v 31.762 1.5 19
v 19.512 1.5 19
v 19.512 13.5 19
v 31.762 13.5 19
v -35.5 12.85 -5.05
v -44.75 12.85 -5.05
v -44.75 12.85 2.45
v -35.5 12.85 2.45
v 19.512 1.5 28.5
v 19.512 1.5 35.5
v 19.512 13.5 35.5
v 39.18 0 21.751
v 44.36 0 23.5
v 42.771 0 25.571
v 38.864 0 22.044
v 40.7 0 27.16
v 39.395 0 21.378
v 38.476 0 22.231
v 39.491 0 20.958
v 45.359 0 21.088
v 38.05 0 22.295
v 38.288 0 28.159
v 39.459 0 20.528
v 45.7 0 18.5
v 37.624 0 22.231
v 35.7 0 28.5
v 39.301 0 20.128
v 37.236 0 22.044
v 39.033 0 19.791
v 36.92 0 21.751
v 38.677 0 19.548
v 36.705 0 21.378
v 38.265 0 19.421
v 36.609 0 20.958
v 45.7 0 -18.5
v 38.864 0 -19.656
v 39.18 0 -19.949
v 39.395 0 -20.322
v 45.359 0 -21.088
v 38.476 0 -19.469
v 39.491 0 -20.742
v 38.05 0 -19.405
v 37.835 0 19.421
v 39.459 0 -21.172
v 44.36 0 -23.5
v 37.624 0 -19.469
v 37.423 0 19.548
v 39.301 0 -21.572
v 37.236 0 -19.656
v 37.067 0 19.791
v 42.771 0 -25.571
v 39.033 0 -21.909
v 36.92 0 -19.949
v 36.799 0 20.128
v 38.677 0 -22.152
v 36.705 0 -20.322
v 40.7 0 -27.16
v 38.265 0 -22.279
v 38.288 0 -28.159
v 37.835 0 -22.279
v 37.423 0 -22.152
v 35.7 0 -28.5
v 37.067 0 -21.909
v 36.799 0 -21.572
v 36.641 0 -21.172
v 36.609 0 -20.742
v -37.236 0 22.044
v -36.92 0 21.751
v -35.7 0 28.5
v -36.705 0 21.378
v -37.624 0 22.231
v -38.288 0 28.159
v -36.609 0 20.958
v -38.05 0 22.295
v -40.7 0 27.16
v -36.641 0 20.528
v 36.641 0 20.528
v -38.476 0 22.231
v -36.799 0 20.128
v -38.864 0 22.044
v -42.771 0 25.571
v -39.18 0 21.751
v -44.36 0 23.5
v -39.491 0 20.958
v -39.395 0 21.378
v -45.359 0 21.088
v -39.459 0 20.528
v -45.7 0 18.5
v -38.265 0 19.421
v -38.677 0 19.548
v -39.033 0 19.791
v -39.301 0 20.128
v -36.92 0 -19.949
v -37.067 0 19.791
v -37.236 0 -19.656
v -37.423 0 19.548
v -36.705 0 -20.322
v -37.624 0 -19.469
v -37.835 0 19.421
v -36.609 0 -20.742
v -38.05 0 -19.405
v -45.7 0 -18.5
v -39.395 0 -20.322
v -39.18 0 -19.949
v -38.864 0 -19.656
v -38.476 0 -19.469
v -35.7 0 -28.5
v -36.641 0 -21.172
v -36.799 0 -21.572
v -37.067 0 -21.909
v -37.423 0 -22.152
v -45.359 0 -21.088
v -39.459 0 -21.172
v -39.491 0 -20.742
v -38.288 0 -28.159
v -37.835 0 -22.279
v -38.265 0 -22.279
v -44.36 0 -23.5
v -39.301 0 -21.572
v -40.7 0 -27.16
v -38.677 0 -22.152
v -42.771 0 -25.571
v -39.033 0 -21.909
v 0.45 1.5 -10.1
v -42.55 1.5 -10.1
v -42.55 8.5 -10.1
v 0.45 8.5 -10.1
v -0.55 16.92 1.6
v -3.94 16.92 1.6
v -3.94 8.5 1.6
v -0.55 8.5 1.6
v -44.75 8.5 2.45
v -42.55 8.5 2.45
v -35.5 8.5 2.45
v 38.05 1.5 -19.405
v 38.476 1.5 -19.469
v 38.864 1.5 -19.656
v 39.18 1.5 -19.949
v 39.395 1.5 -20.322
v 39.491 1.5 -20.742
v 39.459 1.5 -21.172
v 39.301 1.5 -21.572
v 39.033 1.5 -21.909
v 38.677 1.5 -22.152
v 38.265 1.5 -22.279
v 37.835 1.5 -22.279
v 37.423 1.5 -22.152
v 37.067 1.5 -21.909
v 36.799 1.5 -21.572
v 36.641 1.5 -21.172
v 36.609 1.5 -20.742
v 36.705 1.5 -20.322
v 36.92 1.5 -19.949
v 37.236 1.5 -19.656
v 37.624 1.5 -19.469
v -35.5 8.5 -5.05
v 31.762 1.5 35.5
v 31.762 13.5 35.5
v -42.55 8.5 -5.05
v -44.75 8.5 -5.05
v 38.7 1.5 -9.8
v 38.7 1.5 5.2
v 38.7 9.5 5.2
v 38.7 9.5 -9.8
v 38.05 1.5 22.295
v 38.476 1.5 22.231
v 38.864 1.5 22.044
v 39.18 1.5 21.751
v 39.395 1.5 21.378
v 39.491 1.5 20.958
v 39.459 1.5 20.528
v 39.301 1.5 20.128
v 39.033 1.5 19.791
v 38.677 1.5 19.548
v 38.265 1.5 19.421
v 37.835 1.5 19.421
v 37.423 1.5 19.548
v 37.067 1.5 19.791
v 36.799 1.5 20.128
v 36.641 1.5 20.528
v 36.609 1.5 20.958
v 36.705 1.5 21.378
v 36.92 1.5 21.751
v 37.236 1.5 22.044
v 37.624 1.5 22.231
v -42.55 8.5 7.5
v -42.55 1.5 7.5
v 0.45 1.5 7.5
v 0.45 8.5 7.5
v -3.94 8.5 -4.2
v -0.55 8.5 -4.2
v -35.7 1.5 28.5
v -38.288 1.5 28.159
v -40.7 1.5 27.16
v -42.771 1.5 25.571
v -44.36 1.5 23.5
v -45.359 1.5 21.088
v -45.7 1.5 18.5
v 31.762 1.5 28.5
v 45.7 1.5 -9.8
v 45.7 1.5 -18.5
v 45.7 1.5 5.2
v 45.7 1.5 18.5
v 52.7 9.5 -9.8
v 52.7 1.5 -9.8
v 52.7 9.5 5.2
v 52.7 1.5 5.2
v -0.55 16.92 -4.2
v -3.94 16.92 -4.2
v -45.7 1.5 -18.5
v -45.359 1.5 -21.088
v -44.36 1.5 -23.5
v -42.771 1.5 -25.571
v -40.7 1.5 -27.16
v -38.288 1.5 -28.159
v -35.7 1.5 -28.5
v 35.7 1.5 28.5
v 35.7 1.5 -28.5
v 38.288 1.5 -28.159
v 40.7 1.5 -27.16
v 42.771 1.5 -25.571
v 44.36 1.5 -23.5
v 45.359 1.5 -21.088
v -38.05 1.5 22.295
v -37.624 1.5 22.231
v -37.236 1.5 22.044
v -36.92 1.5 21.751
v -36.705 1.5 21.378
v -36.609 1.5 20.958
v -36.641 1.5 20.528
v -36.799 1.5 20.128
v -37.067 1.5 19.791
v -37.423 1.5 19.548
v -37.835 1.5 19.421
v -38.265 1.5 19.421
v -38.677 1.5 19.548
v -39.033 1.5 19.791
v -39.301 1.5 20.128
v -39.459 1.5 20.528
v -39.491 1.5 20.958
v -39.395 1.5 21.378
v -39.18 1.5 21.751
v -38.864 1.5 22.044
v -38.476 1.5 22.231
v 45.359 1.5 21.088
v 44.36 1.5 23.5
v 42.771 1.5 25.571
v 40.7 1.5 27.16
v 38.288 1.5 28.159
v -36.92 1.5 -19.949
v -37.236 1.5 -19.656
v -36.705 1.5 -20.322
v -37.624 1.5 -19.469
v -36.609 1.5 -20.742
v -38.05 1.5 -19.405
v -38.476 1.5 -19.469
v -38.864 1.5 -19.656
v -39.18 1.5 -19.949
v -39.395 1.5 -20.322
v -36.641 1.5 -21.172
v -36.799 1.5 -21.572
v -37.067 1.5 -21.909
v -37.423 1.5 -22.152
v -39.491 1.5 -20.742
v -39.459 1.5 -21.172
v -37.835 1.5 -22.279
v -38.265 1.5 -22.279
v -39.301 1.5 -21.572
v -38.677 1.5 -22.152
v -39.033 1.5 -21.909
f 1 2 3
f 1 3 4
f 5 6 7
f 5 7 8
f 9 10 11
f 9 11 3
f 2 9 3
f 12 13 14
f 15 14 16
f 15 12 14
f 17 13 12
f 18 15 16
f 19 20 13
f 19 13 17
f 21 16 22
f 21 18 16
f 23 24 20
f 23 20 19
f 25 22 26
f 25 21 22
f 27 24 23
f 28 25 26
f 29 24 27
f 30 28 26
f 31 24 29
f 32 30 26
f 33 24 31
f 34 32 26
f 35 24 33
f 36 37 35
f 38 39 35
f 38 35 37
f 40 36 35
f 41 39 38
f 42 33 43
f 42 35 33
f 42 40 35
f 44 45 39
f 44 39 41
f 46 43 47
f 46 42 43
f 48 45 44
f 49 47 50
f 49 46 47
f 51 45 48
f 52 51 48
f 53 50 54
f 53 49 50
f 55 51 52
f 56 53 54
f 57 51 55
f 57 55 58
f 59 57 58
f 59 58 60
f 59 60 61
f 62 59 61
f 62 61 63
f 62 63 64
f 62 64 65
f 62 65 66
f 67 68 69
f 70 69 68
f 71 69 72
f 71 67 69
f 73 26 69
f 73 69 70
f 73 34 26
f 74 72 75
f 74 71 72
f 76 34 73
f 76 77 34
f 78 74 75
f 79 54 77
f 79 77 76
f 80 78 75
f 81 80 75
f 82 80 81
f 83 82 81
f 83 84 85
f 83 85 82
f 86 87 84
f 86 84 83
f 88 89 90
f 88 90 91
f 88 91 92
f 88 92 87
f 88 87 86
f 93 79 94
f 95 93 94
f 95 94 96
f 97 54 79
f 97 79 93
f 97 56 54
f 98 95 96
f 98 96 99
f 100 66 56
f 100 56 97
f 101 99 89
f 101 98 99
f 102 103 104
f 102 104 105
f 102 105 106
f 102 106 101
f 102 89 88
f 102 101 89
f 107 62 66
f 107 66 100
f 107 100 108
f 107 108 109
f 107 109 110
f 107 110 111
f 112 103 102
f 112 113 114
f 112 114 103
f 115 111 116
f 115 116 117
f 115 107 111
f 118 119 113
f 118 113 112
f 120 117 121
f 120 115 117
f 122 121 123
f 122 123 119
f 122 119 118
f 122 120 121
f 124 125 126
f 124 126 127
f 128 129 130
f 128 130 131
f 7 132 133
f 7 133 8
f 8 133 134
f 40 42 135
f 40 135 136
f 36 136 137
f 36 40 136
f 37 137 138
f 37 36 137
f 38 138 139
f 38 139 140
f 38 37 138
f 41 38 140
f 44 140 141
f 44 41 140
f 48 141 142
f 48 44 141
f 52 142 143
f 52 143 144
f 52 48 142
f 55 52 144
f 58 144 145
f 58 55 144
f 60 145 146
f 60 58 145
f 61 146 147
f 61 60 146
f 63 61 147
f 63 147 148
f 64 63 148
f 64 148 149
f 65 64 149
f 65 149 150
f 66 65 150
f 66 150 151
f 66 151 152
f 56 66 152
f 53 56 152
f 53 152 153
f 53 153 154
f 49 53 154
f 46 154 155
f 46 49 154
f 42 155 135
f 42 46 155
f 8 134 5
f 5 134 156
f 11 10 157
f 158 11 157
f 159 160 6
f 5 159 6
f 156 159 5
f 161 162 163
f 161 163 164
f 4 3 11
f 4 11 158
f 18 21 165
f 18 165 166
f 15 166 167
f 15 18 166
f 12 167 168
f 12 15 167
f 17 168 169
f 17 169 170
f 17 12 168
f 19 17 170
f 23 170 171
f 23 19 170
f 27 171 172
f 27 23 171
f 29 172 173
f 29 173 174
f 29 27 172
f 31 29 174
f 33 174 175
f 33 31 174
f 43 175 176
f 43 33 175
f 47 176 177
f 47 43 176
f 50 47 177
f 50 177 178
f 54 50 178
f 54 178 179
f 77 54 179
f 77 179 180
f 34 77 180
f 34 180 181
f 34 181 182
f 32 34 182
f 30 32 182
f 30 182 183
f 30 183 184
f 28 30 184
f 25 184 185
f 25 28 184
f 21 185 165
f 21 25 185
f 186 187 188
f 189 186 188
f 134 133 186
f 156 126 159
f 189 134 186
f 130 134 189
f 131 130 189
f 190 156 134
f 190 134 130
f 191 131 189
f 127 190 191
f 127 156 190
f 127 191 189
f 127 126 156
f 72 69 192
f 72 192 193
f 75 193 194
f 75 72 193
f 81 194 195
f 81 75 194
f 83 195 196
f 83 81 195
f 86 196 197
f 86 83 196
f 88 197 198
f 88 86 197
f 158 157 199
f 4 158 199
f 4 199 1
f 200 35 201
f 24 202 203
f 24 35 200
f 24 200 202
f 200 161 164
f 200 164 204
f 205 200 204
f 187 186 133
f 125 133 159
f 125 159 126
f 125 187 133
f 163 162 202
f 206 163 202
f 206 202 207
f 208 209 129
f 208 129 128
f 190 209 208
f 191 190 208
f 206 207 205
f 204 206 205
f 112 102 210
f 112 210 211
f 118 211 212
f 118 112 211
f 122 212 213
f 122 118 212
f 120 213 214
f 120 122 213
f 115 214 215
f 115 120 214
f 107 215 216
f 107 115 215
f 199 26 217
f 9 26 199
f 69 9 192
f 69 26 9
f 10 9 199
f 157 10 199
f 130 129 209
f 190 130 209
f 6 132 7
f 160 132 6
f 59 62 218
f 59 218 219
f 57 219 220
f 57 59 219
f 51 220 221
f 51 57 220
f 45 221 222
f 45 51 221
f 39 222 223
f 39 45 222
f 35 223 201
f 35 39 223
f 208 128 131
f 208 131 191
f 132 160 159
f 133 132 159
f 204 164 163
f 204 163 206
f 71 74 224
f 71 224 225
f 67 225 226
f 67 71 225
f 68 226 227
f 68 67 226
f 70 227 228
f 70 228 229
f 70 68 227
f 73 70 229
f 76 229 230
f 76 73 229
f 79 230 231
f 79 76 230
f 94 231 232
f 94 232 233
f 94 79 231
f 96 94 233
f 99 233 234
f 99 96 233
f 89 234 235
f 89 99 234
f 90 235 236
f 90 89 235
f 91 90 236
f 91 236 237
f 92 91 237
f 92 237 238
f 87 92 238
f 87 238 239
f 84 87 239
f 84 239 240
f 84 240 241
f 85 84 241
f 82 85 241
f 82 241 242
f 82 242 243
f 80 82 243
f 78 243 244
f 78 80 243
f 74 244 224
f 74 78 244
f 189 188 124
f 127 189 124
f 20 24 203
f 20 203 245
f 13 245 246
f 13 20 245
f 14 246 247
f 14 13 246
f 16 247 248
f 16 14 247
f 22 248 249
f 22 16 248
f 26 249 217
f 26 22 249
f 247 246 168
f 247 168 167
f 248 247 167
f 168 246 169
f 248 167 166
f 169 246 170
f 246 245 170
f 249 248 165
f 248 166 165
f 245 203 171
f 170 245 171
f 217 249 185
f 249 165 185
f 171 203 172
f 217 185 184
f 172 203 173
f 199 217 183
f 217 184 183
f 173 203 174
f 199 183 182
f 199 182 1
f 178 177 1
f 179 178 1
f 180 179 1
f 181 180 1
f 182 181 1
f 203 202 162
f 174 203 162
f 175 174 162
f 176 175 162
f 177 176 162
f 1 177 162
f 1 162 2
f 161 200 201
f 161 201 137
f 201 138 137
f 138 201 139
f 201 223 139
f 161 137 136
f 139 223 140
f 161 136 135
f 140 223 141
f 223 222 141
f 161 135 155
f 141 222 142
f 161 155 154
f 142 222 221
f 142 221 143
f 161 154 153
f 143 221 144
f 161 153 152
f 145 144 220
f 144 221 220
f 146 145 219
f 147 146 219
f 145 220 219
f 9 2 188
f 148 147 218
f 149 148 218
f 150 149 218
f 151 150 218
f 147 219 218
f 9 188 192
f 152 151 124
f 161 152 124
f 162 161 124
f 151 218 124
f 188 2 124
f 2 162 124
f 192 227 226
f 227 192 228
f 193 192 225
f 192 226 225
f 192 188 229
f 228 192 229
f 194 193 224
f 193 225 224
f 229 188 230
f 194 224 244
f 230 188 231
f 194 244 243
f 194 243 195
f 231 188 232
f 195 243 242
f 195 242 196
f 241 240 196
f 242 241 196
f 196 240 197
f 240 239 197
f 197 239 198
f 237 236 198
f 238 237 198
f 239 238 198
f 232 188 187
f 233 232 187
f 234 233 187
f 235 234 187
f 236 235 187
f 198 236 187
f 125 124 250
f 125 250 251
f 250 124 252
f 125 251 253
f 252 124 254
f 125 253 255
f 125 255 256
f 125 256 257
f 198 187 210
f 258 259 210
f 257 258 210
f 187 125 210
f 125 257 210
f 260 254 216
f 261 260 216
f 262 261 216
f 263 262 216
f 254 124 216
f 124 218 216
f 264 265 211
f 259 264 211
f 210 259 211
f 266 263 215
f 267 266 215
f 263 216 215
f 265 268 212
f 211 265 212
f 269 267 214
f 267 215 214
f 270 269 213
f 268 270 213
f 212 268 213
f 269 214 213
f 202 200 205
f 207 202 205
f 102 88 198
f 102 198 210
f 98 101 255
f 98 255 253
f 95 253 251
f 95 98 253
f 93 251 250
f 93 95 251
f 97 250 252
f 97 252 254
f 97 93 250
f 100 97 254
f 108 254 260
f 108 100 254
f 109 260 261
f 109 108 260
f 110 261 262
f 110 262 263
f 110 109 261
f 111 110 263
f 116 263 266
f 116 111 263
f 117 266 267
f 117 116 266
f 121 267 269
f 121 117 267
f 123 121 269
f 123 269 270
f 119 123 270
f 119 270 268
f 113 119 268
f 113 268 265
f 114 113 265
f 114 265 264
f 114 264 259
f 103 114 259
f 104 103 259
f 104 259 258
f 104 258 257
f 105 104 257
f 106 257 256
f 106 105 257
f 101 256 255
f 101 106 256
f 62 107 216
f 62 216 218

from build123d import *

# Parameters (mm, degrees)
SKETCH1_R           = 1.445
BOSS_EXTRUDE1_DEPTH = 1.5
SKETCH2_W           = 43
SKETCH2_H           = 17.6
BOSS_EXTRUDE2_DEPTH = 7
SKETCH3_W           = 9.25
SKETCH3_H           = 7.5
BOSS_EXTRUDE3_DEPTH = 4.35
SKETCH4_W           = 3.39
SKETCH4_H           = 5.8
BOSS_EXTRUDE4_DEPTH = 8.42
SKETCH5_W           = 14
SKETCH5_H           = 15
BOSS_EXTRUDE5_DEPTH = 8
SKETCH6_W           = 12.25
SKETCH6_H           = 16.5
BOSS_EXTRUDE6_DEPTH = 12


with BuildPart() as part:
    # Sketch1 → Boss-Extrude1 (new body)
    with BuildSketch(Plane(origin=(0, 0, 0), x_dir=(1, 0, 0), z_dir=(0, 1, 0))):
        with BuildLine():
            Line((-35.7, 28.5), (35.7, 28.5))
            ThreePointArc((35.7, 28.5), (42.771067812, 25.571067812), (45.7, 18.5))
            Line((45.7, 18.5), (45.7, -18.5))
            ThreePointArc((45.7, -18.5), (42.771067812, -25.571067812), (35.7, -28.5))
            Line((35.7, -28.5), (-35.7, -28.5))
            ThreePointArc((-35.7, -28.5), (-42.771067812, -25.571067812), (-45.7, -18.5))
            Line((-45.7, -18.5), (-45.7, 18.5))
            ThreePointArc((-45.7, 18.5), (-42.771067812, 25.571067812), (-35.7, 28.5))
        make_face()
        with Locations(Location((-38.05, 20.85, 0), (0, 0, 270))):
            Circle(SKETCH1_R, mode=Mode.SUBTRACT)
        with Locations(Location((-38.05, -20.85, 0), (0, 0, 270))):
            Circle(SKETCH1_R, mode=Mode.SUBTRACT)
        with Locations(Location((38.05, 20.85, 0), (0, 0, 270))):
            Circle(SKETCH1_R, mode=Mode.SUBTRACT)
        with Locations(Location((38.05, -20.85, 0), (0, 0, 270))):
            Circle(SKETCH1_R, mode=Mode.SUBTRACT)
    extrude(amount=BOSS_EXTRUDE1_DEPTH)

    # Sketch2 → Boss-Extrude2 (add)
    with BuildSketch(Plane(origin=(0, 1.5, 0), x_dir=(1, 0, 0), z_dir=(0, 1, 0))):
        with Locations((-21.05, 1.3)):
            Rectangle(SKETCH2_W, SKETCH2_H)
    extrude(amount=BOSS_EXTRUDE2_DEPTH)

    # Sketch3 → Boss-Extrude3 (add)
    with BuildSketch(Plane(origin=(0, 8.5, 0), x_dir=(1, 0, 0), z_dir=(0, 1, 0))):
        with Locations((-40.125, 1.3)):
            Rectangle(SKETCH3_W, SKETCH3_H)
    extrude(amount=BOSS_EXTRUDE3_DEPTH)

    # Sketch4 → Boss-Extrude4 (add)
    with BuildSketch(Plane(origin=(0, 8.5, 0), x_dir=(1, 0, 0), z_dir=(0, 1, 0))):
        with Locations((-2.245, 1.3)):
            Rectangle(SKETCH4_W, SKETCH4_H)
    extrude(amount=BOSS_EXTRUDE4_DEPTH)

    # Sketch5 → Boss-Extrude5 (add)
    with BuildSketch(Plane(origin=(0, 1.5, 0), x_dir=(1, 0, 0), z_dir=(0, 1, 0))):
        with Locations((45.7, 2.3)):
            Rectangle(SKETCH5_W, SKETCH5_H)
    extrude(amount=BOSS_EXTRUDE5_DEPTH)

    # Sketch6 → Boss-Extrude6 (add)
    with BuildSketch(Plane(origin=(0, 1.5, 0), x_dir=(1, 0, 0), z_dir=(0, 1, 0))):
        with Locations((25.637075285, -27.25)):
            Rectangle(SKETCH6_W, SKETCH6_H)
    extrude(amount=BOSS_EXTRUDE6_DEPTH)


solid = part.part
